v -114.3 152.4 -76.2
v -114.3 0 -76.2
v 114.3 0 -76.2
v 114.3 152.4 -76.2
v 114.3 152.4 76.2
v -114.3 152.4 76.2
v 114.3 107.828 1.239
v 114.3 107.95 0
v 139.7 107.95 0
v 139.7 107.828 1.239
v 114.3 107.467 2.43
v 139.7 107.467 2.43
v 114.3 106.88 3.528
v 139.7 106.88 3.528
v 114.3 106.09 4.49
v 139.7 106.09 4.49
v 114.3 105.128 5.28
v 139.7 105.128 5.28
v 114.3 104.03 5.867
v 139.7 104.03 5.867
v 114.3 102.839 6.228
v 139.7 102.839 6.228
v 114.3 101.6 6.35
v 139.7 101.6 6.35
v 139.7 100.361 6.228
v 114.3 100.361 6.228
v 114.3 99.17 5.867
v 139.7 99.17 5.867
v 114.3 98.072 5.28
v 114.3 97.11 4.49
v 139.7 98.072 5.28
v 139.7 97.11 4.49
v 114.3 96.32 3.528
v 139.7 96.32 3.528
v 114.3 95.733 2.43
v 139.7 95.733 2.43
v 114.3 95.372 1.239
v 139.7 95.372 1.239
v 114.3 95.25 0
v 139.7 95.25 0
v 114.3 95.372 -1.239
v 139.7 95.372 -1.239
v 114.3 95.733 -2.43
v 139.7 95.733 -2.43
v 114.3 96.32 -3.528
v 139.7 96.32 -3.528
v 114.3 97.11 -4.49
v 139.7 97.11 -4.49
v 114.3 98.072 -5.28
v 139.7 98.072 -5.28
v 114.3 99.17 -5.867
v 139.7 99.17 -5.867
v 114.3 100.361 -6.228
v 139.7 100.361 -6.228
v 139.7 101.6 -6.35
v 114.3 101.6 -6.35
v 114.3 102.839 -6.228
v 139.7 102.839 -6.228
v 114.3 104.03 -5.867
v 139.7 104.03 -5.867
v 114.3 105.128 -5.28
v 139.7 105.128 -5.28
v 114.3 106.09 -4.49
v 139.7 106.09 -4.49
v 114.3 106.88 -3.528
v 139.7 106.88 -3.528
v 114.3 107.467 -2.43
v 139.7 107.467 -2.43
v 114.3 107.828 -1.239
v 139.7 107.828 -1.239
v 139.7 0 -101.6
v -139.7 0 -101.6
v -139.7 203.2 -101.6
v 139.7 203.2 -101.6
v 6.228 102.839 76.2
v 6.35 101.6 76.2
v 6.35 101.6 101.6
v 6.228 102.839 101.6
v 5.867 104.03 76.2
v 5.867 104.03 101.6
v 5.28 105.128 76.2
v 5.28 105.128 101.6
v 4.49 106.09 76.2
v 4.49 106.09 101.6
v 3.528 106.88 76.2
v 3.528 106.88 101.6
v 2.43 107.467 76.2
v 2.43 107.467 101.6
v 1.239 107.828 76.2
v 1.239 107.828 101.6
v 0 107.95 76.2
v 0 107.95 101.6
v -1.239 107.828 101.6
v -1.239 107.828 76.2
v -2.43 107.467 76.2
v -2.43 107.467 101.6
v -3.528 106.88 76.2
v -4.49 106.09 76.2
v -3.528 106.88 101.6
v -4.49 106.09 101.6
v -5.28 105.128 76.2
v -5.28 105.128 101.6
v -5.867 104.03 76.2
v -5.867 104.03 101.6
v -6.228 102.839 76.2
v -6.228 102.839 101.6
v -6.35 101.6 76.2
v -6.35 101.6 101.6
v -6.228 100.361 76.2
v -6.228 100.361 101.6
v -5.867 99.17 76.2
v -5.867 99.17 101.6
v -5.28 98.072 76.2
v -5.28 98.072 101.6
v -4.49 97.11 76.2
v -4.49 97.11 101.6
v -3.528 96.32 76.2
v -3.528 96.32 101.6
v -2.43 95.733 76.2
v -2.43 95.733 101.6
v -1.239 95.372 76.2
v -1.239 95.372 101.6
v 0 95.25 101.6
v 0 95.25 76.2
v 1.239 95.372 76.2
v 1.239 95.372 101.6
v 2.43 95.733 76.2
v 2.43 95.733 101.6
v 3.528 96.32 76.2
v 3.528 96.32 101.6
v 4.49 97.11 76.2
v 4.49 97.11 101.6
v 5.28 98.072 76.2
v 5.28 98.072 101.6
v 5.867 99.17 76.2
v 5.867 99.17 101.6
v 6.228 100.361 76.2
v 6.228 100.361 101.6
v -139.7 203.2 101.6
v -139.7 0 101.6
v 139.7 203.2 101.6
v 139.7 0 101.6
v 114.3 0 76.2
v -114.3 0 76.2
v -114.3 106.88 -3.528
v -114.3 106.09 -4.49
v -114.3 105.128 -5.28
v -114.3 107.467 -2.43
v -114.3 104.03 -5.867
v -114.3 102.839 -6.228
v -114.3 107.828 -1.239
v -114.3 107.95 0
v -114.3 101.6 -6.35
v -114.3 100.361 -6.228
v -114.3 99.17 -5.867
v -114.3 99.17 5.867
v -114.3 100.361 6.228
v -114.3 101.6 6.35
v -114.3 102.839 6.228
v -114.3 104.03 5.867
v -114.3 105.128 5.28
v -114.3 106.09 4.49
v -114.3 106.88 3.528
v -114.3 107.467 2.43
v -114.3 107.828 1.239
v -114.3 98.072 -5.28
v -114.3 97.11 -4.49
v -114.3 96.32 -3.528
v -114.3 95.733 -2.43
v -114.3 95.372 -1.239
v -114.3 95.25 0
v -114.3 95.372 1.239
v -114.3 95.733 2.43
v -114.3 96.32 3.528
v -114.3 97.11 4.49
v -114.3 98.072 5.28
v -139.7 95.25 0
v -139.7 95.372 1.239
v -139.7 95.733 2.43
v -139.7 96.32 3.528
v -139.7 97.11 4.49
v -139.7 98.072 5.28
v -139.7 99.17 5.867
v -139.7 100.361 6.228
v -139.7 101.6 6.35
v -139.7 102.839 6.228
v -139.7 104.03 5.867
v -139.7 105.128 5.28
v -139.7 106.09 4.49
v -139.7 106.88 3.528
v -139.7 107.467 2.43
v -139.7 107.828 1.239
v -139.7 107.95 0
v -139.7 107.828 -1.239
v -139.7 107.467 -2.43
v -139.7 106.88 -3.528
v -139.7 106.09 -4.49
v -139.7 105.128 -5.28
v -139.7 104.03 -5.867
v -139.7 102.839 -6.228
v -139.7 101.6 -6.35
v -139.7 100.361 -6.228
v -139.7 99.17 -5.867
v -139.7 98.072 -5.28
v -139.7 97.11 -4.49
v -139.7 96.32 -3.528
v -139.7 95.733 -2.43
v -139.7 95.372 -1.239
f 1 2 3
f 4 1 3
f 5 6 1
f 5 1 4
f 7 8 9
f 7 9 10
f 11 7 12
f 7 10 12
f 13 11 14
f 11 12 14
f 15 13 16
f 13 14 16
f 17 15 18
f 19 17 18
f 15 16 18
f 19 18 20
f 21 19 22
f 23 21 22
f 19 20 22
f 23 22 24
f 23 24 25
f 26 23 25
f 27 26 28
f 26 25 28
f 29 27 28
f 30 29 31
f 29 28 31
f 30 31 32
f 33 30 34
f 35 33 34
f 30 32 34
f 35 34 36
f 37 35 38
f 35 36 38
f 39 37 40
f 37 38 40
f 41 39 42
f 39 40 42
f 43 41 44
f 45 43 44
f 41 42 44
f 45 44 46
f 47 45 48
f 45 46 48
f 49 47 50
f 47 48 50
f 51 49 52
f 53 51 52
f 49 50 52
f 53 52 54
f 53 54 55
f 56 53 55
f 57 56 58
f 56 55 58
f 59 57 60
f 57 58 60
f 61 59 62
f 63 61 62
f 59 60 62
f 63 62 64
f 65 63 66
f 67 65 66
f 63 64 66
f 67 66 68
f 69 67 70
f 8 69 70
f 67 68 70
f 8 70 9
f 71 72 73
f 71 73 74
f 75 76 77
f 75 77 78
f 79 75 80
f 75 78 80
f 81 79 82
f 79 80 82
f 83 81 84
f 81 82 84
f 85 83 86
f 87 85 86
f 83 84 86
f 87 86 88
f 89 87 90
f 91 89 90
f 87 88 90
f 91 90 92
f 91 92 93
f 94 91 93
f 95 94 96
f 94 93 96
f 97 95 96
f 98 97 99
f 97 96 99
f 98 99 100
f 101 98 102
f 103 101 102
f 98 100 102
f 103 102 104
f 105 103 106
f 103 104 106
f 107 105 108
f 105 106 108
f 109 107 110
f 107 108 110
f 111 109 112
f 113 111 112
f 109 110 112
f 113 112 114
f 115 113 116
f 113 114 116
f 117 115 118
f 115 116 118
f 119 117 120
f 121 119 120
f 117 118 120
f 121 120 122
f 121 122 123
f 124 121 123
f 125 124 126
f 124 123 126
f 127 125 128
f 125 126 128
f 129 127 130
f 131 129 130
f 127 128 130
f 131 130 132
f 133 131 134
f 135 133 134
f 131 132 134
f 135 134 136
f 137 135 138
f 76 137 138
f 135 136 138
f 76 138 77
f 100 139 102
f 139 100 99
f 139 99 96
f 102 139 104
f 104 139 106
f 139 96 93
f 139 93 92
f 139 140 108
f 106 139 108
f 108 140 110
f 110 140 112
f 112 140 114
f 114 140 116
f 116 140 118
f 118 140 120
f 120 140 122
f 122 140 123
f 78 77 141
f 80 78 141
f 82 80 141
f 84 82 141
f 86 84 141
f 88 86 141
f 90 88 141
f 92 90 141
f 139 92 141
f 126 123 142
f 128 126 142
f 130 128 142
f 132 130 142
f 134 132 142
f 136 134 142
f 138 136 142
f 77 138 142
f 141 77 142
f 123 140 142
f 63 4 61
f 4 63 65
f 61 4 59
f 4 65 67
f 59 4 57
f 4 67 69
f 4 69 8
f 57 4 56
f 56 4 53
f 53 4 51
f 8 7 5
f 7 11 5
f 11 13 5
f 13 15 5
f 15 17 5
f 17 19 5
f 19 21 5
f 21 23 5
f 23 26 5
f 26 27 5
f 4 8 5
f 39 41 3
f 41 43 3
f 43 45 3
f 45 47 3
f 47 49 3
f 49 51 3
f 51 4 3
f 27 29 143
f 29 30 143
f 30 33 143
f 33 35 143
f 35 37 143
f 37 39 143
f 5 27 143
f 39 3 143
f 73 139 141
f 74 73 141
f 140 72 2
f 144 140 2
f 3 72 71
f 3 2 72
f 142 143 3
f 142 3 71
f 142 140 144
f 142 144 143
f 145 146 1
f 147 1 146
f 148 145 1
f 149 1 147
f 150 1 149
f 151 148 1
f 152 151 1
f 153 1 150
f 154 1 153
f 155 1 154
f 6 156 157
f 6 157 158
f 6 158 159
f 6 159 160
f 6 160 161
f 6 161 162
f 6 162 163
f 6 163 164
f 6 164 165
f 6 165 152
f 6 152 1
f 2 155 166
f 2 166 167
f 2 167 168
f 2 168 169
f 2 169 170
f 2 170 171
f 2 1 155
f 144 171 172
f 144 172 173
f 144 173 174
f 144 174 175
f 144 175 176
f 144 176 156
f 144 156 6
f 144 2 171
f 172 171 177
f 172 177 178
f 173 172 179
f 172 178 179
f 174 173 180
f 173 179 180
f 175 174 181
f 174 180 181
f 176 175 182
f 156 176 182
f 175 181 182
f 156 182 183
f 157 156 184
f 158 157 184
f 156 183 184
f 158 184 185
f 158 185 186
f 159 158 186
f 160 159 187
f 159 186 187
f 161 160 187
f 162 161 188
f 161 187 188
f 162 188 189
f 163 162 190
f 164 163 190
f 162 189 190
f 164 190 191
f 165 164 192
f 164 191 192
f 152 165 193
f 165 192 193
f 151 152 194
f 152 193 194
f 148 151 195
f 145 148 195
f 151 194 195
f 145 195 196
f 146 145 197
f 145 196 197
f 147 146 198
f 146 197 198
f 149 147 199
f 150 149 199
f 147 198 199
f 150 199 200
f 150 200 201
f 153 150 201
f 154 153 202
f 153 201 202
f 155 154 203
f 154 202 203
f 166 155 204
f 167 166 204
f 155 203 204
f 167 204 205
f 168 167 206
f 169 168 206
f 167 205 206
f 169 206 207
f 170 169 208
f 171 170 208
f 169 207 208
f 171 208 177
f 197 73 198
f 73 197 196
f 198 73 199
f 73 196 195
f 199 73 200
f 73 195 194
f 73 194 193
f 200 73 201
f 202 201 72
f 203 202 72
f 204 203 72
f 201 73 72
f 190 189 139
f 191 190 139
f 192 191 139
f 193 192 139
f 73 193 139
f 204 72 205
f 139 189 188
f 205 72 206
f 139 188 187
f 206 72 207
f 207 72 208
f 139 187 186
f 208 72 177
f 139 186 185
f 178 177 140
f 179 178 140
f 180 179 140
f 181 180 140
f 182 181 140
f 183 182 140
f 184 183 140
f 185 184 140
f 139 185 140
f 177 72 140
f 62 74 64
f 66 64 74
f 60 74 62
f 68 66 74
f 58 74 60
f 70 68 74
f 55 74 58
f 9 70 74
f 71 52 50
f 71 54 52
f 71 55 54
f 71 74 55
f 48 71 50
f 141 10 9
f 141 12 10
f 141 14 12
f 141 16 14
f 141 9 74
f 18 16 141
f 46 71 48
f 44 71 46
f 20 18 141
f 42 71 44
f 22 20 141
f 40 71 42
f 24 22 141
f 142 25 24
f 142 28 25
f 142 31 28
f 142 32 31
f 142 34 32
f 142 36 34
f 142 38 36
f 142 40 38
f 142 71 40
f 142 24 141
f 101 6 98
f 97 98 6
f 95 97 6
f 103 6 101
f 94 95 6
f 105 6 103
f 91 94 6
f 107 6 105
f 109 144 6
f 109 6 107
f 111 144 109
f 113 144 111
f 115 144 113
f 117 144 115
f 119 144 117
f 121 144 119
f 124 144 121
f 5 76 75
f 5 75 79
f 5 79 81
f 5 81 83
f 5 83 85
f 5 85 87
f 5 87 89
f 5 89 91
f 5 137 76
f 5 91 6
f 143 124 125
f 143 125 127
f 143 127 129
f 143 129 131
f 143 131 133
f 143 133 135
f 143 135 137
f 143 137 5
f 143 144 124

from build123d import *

# Parameters (mm, degrees)
F0_W     = 279.4
F0_H     = 203.2
F1_DEPTH = 203.2
F5_W     = 228.6
F5_H     = 152.4
F6_DEPTH = 152.4
F2_R     = 6.35
F7_DEPTH = 25.4
F3_R     = 6.35
F8_DEPTH = 25.4
F4_R     = 6.35
F9_DEPTH = 25.4


with BuildPart() as f1:
    # F0 (on Front) → F1 (new body)
    with BuildSketch(Plane.XZ):
        Rectangle(F0_W, F0_H)
    extrude(amount=-F1_DEPTH)

    # F5 (on Front) → F6 (cut)
    with BuildSketch(Plane.XZ):
        Rectangle(F5_W, F5_H)
    extrude(amount=-F6_DEPTH, mode=Mode.SUBTRACT)

    # F2 (on face) → F7 (cut)
    with BuildSketch(Plane.XY.offset(101.6)):
        with Locations((0, 101.6)):
            Circle(F2_R)
    extrude(amount=-F7_DEPTH, mode=Mode.SUBTRACT)

    # F3 (on face) → F8 (cut)
    with BuildSketch(Plane.YZ.offset(139.7)):
        with Locations((101.6, 0)):
            Circle(F3_R)
    extrude(amount=-F8_DEPTH, mode=Mode.SUBTRACT)

    # F4 (on face) → F9 (cut)
    with BuildSketch(Plane(origin=(-139.7, 0, 0), x_dir=(0, -1, 0), z_dir=(-1, 0, 0))):
        with Locations((-101.6, 0)):
            Circle(F4_R)
    extrude(amount=-F9_DEPTH, mode=Mode.SUBTRACT)


solid = f1.part
